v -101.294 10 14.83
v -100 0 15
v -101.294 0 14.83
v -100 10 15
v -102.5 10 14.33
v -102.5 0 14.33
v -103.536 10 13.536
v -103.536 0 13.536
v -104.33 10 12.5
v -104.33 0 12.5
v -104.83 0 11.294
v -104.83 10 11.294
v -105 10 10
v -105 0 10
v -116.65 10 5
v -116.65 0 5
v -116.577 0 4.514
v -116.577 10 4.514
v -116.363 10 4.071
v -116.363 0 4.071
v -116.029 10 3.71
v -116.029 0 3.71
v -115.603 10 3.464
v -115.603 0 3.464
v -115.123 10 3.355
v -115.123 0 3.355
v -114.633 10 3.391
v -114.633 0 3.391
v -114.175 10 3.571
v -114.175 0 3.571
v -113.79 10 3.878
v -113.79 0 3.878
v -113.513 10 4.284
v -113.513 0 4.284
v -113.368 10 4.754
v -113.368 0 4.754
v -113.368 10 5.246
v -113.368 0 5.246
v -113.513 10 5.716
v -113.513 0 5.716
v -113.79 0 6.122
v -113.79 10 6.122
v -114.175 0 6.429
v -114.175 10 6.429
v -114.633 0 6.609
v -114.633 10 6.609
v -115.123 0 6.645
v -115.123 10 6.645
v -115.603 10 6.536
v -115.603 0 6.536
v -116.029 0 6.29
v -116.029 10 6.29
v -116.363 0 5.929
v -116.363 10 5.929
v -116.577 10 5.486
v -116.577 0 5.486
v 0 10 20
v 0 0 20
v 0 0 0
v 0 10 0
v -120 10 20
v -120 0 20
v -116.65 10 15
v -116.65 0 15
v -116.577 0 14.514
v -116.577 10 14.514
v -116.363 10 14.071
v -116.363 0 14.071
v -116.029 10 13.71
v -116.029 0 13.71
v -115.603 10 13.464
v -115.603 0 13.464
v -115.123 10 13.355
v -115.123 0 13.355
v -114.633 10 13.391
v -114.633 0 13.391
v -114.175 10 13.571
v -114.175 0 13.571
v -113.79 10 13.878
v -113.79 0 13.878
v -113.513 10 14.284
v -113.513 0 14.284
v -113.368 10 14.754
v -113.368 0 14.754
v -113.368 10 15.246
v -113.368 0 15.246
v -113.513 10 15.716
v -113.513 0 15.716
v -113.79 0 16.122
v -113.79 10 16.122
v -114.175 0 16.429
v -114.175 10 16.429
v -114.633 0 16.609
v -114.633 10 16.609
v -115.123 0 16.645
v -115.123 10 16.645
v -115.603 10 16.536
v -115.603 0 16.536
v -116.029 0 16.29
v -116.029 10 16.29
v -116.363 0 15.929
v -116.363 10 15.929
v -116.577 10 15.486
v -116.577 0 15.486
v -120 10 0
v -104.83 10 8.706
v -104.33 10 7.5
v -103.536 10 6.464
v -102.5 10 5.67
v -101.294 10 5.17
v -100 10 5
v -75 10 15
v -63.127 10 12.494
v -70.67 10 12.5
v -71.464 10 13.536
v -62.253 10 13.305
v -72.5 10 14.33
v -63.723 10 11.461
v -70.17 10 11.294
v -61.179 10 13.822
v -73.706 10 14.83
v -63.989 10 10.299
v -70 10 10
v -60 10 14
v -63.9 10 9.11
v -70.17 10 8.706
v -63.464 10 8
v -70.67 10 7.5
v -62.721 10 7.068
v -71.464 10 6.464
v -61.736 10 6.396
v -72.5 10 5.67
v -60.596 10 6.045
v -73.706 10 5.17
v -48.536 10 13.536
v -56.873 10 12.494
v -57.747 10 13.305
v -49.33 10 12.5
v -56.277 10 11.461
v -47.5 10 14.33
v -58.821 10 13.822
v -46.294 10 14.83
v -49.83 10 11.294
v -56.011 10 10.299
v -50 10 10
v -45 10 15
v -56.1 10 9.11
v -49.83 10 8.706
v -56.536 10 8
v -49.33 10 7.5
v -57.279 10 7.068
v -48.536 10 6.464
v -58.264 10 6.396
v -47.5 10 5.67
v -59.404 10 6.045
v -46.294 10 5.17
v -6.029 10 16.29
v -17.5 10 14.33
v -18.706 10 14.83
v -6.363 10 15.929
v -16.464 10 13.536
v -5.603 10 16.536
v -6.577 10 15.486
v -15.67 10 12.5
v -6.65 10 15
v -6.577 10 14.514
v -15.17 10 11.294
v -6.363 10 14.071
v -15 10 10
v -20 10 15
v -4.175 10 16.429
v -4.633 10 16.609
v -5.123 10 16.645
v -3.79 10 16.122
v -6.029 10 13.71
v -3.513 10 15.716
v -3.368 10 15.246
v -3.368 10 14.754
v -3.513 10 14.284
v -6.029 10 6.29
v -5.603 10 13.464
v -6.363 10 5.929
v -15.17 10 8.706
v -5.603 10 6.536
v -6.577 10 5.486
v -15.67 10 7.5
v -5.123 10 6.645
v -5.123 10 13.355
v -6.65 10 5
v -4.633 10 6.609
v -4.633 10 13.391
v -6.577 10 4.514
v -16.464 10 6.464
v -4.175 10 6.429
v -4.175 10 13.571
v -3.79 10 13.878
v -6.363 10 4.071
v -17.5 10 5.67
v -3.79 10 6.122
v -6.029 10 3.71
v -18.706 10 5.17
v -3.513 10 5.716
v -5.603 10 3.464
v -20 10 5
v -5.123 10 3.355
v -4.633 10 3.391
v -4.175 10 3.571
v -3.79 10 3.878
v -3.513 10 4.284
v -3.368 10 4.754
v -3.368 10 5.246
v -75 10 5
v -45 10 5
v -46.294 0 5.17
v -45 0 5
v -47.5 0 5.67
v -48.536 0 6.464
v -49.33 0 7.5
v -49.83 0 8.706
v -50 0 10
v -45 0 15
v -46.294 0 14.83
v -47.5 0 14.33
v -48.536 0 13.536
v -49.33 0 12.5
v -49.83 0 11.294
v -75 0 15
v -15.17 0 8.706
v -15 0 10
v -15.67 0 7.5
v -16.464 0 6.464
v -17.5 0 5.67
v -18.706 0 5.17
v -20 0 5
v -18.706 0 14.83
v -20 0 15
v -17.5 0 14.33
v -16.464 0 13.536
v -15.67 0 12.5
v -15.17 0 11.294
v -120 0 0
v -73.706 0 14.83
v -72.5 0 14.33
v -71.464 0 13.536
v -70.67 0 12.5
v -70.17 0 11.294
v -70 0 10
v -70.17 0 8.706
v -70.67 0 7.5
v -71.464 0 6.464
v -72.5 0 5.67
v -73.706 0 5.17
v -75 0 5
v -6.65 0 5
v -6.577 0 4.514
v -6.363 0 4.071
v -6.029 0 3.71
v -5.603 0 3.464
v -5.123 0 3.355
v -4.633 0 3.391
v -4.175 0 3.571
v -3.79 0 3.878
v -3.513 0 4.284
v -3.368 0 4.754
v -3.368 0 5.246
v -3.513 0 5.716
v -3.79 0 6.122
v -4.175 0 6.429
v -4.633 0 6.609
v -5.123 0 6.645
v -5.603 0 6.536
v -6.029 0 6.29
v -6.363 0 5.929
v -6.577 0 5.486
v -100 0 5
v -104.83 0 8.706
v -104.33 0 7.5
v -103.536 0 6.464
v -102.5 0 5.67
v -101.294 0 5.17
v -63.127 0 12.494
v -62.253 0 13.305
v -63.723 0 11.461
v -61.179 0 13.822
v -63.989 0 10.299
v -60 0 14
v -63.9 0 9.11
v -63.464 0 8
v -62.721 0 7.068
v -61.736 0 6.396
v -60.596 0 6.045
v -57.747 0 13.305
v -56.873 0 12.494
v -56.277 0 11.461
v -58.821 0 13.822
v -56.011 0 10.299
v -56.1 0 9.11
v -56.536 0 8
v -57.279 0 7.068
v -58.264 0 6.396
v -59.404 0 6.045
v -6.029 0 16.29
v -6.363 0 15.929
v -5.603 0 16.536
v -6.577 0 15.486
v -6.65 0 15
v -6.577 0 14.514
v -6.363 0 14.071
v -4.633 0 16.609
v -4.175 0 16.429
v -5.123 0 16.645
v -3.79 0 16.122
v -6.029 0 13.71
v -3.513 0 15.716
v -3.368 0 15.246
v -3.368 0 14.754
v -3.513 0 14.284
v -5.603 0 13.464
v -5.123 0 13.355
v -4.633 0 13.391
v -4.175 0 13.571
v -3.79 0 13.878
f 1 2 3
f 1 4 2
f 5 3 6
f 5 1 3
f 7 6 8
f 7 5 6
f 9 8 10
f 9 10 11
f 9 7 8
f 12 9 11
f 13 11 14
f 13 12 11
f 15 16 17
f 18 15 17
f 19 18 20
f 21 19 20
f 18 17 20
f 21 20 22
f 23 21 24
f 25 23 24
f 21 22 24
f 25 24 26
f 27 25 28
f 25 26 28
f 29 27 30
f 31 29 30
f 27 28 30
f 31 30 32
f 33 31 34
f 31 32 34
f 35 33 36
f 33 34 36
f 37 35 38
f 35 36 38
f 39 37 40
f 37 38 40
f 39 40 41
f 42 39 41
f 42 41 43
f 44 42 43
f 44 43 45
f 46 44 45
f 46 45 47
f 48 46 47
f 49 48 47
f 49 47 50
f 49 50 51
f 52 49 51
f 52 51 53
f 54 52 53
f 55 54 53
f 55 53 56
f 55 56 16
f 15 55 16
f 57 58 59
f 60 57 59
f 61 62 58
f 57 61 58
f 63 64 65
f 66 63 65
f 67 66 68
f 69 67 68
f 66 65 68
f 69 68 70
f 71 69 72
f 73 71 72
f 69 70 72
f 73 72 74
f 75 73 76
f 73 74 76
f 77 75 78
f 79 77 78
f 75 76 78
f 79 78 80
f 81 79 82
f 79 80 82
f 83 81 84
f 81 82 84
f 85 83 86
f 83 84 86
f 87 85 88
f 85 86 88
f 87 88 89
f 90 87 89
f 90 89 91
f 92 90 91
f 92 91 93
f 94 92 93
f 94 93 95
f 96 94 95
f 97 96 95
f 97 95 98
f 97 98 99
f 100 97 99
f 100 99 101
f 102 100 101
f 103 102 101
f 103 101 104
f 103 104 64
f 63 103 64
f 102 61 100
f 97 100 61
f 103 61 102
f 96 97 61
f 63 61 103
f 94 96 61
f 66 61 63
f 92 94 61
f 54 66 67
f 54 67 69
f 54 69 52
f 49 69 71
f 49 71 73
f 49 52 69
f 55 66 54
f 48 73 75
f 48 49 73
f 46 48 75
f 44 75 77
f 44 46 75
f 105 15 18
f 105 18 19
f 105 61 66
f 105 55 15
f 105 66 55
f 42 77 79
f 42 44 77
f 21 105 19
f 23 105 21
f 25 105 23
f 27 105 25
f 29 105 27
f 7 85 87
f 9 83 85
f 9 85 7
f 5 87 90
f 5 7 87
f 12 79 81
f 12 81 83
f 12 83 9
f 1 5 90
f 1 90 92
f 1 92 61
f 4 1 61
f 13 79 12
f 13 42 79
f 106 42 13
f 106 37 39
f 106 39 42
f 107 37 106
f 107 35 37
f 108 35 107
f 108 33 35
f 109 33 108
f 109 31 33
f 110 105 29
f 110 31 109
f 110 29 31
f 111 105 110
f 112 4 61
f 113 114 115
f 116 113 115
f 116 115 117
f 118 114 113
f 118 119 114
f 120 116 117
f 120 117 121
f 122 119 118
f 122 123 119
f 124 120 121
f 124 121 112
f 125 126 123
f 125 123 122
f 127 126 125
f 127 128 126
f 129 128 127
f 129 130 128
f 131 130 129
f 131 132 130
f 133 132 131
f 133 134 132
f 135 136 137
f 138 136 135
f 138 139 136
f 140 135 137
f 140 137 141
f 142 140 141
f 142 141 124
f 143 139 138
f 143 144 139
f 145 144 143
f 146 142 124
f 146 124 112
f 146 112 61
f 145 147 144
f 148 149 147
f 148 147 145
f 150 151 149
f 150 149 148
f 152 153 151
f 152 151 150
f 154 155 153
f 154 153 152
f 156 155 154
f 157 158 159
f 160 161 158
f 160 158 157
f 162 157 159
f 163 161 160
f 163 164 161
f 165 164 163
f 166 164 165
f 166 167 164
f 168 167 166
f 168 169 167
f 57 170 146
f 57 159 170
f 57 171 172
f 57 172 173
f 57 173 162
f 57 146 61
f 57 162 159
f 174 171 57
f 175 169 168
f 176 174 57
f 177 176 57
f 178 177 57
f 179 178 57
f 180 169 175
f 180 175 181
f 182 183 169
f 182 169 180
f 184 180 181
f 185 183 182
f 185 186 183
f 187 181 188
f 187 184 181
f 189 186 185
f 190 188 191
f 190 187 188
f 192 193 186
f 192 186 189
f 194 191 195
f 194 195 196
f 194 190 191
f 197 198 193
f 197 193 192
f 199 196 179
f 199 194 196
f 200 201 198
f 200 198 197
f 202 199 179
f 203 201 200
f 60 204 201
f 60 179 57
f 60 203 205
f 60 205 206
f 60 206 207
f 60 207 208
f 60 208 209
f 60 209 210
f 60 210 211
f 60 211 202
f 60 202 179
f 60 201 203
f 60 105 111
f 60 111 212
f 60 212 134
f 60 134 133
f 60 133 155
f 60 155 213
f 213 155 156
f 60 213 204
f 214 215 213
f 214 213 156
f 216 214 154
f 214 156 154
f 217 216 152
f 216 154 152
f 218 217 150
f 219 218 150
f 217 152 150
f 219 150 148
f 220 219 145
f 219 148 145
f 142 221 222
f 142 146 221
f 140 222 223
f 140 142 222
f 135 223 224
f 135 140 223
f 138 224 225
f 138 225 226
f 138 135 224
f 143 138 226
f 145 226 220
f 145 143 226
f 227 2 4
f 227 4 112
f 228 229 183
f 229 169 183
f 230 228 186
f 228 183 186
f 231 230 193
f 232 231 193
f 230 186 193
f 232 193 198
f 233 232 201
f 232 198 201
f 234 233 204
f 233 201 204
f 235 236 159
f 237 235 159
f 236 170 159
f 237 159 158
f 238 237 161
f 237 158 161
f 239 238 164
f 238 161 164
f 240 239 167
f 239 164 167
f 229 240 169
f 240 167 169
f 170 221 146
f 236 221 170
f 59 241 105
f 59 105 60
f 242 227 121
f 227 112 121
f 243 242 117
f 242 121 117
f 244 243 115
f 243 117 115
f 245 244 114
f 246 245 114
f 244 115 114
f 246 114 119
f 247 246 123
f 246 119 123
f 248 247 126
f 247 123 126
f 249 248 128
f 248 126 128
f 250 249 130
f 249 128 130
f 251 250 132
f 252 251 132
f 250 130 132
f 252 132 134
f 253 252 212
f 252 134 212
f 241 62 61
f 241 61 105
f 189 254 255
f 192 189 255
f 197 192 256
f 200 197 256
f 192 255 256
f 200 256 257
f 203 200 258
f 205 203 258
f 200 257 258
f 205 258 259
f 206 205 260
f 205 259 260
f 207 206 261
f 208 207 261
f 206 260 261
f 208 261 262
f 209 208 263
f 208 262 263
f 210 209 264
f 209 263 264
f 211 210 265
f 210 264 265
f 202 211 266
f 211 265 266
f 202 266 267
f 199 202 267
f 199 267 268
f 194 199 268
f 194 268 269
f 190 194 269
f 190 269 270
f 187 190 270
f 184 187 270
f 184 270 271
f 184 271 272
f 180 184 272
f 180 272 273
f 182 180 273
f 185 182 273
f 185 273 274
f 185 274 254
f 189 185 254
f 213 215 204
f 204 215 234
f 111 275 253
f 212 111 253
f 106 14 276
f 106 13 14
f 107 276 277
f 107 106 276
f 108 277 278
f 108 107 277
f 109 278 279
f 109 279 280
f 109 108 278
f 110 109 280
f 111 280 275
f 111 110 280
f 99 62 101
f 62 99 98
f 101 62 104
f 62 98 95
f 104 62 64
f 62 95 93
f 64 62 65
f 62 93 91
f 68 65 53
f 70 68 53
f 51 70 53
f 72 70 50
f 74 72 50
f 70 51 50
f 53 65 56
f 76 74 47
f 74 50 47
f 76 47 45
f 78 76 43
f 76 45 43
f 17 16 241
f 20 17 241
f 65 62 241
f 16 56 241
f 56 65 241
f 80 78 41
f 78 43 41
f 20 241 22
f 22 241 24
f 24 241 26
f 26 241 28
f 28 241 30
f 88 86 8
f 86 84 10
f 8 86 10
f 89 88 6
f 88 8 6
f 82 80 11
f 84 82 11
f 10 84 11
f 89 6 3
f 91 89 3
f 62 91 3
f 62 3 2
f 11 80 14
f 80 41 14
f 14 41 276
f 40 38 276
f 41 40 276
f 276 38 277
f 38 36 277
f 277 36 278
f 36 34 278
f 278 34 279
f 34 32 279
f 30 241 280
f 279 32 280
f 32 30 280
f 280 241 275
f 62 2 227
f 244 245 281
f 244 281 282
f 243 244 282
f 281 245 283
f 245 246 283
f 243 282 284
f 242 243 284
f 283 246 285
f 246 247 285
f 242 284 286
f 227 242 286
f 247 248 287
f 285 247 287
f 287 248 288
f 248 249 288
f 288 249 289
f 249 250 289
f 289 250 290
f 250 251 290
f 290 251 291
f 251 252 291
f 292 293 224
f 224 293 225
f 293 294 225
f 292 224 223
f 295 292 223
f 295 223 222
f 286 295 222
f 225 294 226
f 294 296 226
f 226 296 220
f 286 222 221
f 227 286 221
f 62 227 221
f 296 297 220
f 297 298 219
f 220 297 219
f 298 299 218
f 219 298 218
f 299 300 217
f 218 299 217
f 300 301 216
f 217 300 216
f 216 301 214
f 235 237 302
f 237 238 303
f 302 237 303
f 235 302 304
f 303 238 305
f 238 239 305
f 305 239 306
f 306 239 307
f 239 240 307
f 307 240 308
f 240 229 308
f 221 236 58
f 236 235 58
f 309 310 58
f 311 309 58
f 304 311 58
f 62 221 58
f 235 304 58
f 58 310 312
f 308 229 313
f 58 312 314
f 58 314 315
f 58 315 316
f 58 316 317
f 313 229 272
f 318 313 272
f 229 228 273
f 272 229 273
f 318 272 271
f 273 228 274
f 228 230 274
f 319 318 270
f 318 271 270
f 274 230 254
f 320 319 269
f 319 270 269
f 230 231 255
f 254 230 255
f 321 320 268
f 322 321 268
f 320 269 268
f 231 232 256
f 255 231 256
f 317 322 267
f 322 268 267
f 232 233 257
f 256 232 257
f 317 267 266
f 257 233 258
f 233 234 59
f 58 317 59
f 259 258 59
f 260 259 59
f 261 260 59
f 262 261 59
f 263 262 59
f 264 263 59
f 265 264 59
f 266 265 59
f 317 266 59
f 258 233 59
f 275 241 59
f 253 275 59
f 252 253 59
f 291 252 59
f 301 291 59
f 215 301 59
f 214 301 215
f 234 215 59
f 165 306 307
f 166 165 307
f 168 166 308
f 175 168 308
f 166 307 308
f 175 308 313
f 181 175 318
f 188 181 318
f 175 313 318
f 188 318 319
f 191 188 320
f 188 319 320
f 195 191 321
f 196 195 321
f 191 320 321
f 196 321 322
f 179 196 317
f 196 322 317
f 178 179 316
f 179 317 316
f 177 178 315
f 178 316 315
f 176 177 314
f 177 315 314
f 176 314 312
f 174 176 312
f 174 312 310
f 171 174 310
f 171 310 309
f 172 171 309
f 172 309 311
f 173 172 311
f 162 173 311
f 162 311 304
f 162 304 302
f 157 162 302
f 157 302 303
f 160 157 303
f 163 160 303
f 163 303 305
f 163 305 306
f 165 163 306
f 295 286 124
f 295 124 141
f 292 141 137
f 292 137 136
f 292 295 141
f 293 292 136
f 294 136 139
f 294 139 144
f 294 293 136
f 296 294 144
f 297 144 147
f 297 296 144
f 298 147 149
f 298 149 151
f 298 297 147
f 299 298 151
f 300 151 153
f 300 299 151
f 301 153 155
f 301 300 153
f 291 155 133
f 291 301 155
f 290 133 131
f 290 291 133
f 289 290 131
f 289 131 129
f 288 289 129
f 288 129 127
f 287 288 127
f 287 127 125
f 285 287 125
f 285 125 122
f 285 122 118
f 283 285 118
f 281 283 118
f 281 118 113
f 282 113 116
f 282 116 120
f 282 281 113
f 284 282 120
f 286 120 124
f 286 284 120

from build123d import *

# Parameters (mm, degrees)
SKETCH1_W             = 120
SKETCH1_H             = 20
SKETCH1_R             = 4
SKETCH1_W_2           = 35
SKETCH1_H_2           = 10
BOSS_EXTRUDE1_DEPTH   = 10
FILLET1_R             = 5
M4X0_7_TAPPED_HOLE1_D = 3.3


with BuildPart() as part:
    # Sketch1 → Boss-Extrude1 (new body)
    with BuildSketch(Plane(origin=(0, 0, 0), x_dir=(1, 0, 0), z_dir=(0, 1, 0))):
        with Locations((-60, -10)):
            Rectangle(SKETCH1_W, SKETCH1_H)
        with Locations(Location((-60, -10, 0), (0, 0, 270))):
            Circle(SKETCH1_R, mode=Mode.SUBTRACT)
        with Locations((-87.5, -10)):
            Rectangle(SKETCH1_W_2, SKETCH1_H_2, mode=Mode.SUBTRACT)
        with Locations((-32.5, -10)):
            Rectangle(SKETCH1_W_2, SKETCH1_H_2, mode=Mode.SUBTRACT)
    extrude(amount=BOSS_EXTRUDE1_DEPTH)

    # Fillet1
    fillet1_edges = [part.edges().sort_by_distance(p)[0] for p in [
        (-15, 5, 15),
        (-15, 5, 5),
        (-50, 5, 15),
        (-50, 5, 5),
        (-105, 5, 5),
        (-105, 5, 15),
        (-70, 5, 5),
        (-70, 5, 15),
    ]]
    fillet(fillet1_edges, radius=FILLET1_R - 0.0001)  # a hair under: the kernel refuses the full size

    # M4x0.7 Tapped Hole1 (through all)
    with Locations(Plane(origin=(0, 10, 0), x_dir=(1, 0, 0), z_dir=(0, 1, 0))):
        with Locations((-115, -5), (-115, -15), (-5, -5), (-5, -15)):
            Hole(M4X0_7_TAPPED_HOLE1_D / 2)


solid = part.part
